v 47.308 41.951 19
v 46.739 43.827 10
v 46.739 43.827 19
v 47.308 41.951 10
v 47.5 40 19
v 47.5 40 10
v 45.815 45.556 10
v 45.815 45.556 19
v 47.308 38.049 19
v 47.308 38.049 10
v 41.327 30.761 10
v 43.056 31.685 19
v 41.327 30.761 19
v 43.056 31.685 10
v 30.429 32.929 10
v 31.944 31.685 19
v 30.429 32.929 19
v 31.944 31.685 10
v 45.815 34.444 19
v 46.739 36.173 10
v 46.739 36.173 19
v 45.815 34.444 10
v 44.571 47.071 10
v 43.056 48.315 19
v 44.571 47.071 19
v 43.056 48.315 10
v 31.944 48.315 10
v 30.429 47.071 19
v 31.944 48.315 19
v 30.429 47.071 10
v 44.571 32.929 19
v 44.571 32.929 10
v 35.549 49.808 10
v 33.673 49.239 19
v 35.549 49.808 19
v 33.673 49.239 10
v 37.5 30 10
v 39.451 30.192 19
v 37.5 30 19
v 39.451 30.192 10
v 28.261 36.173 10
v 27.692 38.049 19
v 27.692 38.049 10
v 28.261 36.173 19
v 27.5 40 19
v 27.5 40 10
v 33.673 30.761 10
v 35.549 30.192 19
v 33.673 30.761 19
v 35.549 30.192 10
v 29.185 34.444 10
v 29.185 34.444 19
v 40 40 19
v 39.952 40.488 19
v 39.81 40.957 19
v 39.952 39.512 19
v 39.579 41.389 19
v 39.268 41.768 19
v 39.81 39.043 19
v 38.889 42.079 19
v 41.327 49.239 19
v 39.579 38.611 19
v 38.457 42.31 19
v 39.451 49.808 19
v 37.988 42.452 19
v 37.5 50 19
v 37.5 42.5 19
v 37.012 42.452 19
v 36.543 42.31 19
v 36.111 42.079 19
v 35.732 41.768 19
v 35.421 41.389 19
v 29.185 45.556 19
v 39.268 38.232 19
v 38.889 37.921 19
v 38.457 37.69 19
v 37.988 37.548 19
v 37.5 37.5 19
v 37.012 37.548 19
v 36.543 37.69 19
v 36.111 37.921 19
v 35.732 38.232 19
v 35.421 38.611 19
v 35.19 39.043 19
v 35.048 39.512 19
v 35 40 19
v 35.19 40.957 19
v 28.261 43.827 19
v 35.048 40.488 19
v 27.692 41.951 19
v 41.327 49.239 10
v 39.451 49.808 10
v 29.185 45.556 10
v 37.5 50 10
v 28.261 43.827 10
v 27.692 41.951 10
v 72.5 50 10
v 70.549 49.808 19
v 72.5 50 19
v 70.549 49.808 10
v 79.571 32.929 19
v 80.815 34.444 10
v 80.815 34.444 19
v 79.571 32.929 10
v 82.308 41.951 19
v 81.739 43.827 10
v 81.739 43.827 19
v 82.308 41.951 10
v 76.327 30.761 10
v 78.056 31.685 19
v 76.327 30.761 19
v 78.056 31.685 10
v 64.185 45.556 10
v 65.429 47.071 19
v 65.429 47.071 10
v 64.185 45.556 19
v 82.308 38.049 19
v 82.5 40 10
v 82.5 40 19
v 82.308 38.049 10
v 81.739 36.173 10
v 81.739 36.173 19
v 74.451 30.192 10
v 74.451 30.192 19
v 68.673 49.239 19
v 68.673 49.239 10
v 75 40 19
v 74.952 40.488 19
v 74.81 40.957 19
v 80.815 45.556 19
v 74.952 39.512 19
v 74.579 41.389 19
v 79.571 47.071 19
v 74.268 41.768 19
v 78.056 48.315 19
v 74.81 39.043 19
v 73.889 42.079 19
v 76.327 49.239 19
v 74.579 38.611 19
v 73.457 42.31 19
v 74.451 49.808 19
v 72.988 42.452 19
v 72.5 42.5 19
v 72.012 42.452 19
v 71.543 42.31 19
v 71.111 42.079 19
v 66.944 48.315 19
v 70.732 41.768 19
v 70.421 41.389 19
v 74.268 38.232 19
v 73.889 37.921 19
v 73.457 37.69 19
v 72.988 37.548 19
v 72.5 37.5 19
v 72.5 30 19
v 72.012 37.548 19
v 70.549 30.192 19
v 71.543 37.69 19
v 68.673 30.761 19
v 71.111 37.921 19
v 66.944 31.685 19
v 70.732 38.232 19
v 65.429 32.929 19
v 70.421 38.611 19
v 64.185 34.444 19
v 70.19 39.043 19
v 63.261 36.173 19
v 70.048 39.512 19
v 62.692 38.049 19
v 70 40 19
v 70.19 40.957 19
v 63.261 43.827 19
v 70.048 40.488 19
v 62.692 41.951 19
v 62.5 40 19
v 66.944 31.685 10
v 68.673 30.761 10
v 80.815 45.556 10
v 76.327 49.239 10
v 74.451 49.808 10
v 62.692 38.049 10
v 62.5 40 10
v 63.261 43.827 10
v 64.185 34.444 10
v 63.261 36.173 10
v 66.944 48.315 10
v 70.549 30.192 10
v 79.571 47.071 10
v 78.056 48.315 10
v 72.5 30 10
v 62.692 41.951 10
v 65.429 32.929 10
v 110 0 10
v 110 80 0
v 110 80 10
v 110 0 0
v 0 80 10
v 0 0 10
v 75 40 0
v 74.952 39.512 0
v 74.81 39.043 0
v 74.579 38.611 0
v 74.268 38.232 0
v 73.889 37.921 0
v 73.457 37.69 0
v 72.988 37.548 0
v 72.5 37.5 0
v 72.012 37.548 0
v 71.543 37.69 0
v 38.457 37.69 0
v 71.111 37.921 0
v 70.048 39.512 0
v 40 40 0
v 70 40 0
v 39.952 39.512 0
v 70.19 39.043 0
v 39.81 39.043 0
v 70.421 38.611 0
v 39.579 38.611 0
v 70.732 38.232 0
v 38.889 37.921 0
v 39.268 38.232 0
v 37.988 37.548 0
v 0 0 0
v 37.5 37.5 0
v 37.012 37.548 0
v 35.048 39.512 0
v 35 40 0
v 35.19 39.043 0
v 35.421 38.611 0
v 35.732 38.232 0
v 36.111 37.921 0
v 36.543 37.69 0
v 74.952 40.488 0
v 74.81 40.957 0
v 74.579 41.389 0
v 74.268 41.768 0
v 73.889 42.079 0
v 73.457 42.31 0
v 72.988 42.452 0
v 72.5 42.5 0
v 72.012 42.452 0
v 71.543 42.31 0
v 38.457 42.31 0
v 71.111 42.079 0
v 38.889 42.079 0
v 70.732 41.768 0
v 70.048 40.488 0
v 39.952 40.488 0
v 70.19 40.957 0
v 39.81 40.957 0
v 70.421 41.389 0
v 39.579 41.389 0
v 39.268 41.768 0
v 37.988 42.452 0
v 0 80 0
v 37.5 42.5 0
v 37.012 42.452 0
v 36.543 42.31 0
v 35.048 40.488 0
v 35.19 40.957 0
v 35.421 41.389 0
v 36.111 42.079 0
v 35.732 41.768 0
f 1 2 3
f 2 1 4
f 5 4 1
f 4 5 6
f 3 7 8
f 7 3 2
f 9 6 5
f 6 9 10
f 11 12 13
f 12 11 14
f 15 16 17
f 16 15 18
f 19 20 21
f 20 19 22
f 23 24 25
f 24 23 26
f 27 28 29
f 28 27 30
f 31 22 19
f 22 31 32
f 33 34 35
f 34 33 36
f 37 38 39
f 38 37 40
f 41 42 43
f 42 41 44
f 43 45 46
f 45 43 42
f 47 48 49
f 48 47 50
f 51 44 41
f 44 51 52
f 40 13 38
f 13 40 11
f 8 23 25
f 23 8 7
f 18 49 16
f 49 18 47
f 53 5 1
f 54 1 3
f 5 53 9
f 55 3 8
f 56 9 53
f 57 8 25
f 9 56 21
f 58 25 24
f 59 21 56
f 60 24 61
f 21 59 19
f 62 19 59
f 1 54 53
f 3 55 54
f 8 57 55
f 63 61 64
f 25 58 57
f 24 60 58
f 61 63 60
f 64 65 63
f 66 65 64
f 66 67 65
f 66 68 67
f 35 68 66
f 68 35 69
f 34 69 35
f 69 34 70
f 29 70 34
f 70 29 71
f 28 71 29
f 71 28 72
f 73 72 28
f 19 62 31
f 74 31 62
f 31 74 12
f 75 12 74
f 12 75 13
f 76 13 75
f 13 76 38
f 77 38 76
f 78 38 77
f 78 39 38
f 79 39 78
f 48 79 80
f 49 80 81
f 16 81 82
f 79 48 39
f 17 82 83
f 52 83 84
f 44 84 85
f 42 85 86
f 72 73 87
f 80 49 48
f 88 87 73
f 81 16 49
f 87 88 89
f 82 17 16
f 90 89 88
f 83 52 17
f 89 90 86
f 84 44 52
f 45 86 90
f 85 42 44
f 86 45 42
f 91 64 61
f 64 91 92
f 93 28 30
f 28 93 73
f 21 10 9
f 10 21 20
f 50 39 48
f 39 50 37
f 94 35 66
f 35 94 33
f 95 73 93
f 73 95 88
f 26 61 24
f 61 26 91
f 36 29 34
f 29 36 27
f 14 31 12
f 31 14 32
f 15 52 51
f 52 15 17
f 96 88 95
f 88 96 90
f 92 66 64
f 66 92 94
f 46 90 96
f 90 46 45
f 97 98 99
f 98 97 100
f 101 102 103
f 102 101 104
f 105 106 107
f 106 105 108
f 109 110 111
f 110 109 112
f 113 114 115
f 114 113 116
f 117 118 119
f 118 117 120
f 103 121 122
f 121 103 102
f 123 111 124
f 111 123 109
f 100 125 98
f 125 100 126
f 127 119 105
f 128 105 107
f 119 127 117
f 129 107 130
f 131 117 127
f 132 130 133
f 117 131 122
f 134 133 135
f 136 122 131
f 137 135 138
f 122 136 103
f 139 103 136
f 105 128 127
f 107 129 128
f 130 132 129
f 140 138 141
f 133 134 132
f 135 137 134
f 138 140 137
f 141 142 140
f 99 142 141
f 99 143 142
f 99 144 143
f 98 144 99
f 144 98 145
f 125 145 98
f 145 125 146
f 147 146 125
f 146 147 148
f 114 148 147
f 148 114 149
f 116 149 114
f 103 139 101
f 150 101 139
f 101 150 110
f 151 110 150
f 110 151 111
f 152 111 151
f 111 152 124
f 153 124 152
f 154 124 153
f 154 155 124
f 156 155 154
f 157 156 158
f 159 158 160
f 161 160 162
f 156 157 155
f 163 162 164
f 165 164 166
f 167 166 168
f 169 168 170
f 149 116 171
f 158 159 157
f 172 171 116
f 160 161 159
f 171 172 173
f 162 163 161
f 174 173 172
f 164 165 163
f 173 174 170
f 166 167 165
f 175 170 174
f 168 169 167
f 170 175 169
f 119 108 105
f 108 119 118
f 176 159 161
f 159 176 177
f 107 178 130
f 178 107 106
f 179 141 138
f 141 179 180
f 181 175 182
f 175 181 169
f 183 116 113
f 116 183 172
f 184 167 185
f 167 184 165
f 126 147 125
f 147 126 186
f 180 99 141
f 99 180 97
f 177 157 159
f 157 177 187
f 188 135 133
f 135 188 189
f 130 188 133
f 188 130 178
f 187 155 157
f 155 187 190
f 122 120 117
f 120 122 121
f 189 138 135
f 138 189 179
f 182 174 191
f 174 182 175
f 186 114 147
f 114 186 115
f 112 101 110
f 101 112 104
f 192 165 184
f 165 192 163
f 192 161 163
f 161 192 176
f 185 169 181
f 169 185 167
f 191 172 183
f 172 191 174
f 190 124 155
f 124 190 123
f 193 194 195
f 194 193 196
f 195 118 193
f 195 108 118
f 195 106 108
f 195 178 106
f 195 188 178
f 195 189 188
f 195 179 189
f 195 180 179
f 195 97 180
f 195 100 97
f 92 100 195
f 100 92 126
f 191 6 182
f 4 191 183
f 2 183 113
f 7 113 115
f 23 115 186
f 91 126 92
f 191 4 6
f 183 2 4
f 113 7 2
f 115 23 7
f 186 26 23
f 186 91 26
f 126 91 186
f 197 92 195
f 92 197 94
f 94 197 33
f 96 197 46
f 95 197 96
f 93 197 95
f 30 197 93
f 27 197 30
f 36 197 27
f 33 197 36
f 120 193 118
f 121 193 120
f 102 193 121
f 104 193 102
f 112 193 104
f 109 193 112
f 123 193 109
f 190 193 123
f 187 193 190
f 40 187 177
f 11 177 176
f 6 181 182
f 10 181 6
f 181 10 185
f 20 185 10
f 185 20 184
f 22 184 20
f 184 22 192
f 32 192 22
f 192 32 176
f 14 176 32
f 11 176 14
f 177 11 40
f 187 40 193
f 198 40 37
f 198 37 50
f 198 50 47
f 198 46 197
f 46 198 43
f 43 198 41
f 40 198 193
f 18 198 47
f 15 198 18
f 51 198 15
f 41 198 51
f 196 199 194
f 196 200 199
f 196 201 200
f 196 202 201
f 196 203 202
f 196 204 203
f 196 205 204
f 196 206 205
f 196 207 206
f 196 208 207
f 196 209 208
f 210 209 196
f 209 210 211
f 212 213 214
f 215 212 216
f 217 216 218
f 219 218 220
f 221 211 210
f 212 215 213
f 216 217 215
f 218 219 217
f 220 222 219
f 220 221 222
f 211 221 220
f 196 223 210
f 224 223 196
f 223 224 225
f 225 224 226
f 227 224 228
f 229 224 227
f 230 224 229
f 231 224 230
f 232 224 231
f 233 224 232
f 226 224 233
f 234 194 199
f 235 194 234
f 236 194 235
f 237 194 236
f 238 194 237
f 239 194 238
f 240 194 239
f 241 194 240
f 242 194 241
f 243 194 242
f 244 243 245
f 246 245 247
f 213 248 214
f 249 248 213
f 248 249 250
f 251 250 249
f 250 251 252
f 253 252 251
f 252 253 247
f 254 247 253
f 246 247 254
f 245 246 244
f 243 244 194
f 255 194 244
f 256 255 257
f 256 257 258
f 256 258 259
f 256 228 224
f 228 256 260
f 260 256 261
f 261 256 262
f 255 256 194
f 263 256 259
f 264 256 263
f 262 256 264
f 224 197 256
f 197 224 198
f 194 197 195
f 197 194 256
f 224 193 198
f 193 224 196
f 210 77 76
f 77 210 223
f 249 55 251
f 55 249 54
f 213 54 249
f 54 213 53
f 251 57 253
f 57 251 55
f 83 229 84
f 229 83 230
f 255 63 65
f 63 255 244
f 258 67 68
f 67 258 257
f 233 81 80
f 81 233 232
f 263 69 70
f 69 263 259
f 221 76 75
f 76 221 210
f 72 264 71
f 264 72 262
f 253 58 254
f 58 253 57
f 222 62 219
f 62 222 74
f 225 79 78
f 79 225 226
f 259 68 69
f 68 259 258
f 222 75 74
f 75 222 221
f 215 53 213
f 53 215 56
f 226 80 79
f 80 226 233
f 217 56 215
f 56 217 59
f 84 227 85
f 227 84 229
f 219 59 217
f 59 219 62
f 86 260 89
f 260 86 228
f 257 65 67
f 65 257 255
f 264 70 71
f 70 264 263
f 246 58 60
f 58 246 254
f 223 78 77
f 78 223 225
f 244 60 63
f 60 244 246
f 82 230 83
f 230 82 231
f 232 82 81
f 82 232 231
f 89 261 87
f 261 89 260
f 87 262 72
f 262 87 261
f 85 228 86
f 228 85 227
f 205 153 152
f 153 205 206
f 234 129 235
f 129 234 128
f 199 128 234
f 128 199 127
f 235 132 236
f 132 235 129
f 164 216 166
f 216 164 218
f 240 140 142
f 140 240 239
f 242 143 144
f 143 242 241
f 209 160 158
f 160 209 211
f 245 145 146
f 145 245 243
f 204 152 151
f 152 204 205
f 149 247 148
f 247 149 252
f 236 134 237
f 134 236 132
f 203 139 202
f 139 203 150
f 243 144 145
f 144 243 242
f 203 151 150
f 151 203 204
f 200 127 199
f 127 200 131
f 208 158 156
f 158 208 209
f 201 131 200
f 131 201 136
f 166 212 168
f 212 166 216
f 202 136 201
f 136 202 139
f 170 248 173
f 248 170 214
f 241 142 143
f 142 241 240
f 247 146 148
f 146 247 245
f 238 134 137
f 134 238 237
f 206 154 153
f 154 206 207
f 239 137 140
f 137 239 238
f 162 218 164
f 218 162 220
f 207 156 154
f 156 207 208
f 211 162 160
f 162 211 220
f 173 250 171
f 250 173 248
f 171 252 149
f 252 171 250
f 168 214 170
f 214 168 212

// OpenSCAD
$fn = 32;

// ----------------------------------------------------------------------
// Drill jig: two_boss jig
// ----------------------------------------------------------------------

// --- parameters (mm) ---
plate_l = 110;            // plate length, X
plate_w = 80;             // plate width, Y
plate_t = 10;             // plate thickness
boss_d = 20;              // guide boss diameter
boss_h = 10;              // boss height above the plate
guide_d = 5;              // guide hole diameter
boss_pitch = 35;          // boss pitch

n_boss = 2;  // guide bosses
boss_x0 = (plate_l - (n_boss - 1) * boss_pitch) / 2;  // first boss X
boss_top = plate_t - 1 + boss_h;  // boss crown height
total_h = boss_top;  // overall height

difference() {
  union() {
  cube([plate_l, plate_w, plate_t]);
  for (i = [0 : n_boss - 1])
    translate([boss_x0 + i * boss_pitch, plate_w / 2, plate_t - 1])
      cylinder(h = boss_h, d = boss_d);
  }
  for (i = [0 : n_boss - 1])
    translate([boss_x0 + i * boss_pitch, plate_w / 2, -1])
      cylinder(h = plate_t + boss_h, d = guide_d);
}
